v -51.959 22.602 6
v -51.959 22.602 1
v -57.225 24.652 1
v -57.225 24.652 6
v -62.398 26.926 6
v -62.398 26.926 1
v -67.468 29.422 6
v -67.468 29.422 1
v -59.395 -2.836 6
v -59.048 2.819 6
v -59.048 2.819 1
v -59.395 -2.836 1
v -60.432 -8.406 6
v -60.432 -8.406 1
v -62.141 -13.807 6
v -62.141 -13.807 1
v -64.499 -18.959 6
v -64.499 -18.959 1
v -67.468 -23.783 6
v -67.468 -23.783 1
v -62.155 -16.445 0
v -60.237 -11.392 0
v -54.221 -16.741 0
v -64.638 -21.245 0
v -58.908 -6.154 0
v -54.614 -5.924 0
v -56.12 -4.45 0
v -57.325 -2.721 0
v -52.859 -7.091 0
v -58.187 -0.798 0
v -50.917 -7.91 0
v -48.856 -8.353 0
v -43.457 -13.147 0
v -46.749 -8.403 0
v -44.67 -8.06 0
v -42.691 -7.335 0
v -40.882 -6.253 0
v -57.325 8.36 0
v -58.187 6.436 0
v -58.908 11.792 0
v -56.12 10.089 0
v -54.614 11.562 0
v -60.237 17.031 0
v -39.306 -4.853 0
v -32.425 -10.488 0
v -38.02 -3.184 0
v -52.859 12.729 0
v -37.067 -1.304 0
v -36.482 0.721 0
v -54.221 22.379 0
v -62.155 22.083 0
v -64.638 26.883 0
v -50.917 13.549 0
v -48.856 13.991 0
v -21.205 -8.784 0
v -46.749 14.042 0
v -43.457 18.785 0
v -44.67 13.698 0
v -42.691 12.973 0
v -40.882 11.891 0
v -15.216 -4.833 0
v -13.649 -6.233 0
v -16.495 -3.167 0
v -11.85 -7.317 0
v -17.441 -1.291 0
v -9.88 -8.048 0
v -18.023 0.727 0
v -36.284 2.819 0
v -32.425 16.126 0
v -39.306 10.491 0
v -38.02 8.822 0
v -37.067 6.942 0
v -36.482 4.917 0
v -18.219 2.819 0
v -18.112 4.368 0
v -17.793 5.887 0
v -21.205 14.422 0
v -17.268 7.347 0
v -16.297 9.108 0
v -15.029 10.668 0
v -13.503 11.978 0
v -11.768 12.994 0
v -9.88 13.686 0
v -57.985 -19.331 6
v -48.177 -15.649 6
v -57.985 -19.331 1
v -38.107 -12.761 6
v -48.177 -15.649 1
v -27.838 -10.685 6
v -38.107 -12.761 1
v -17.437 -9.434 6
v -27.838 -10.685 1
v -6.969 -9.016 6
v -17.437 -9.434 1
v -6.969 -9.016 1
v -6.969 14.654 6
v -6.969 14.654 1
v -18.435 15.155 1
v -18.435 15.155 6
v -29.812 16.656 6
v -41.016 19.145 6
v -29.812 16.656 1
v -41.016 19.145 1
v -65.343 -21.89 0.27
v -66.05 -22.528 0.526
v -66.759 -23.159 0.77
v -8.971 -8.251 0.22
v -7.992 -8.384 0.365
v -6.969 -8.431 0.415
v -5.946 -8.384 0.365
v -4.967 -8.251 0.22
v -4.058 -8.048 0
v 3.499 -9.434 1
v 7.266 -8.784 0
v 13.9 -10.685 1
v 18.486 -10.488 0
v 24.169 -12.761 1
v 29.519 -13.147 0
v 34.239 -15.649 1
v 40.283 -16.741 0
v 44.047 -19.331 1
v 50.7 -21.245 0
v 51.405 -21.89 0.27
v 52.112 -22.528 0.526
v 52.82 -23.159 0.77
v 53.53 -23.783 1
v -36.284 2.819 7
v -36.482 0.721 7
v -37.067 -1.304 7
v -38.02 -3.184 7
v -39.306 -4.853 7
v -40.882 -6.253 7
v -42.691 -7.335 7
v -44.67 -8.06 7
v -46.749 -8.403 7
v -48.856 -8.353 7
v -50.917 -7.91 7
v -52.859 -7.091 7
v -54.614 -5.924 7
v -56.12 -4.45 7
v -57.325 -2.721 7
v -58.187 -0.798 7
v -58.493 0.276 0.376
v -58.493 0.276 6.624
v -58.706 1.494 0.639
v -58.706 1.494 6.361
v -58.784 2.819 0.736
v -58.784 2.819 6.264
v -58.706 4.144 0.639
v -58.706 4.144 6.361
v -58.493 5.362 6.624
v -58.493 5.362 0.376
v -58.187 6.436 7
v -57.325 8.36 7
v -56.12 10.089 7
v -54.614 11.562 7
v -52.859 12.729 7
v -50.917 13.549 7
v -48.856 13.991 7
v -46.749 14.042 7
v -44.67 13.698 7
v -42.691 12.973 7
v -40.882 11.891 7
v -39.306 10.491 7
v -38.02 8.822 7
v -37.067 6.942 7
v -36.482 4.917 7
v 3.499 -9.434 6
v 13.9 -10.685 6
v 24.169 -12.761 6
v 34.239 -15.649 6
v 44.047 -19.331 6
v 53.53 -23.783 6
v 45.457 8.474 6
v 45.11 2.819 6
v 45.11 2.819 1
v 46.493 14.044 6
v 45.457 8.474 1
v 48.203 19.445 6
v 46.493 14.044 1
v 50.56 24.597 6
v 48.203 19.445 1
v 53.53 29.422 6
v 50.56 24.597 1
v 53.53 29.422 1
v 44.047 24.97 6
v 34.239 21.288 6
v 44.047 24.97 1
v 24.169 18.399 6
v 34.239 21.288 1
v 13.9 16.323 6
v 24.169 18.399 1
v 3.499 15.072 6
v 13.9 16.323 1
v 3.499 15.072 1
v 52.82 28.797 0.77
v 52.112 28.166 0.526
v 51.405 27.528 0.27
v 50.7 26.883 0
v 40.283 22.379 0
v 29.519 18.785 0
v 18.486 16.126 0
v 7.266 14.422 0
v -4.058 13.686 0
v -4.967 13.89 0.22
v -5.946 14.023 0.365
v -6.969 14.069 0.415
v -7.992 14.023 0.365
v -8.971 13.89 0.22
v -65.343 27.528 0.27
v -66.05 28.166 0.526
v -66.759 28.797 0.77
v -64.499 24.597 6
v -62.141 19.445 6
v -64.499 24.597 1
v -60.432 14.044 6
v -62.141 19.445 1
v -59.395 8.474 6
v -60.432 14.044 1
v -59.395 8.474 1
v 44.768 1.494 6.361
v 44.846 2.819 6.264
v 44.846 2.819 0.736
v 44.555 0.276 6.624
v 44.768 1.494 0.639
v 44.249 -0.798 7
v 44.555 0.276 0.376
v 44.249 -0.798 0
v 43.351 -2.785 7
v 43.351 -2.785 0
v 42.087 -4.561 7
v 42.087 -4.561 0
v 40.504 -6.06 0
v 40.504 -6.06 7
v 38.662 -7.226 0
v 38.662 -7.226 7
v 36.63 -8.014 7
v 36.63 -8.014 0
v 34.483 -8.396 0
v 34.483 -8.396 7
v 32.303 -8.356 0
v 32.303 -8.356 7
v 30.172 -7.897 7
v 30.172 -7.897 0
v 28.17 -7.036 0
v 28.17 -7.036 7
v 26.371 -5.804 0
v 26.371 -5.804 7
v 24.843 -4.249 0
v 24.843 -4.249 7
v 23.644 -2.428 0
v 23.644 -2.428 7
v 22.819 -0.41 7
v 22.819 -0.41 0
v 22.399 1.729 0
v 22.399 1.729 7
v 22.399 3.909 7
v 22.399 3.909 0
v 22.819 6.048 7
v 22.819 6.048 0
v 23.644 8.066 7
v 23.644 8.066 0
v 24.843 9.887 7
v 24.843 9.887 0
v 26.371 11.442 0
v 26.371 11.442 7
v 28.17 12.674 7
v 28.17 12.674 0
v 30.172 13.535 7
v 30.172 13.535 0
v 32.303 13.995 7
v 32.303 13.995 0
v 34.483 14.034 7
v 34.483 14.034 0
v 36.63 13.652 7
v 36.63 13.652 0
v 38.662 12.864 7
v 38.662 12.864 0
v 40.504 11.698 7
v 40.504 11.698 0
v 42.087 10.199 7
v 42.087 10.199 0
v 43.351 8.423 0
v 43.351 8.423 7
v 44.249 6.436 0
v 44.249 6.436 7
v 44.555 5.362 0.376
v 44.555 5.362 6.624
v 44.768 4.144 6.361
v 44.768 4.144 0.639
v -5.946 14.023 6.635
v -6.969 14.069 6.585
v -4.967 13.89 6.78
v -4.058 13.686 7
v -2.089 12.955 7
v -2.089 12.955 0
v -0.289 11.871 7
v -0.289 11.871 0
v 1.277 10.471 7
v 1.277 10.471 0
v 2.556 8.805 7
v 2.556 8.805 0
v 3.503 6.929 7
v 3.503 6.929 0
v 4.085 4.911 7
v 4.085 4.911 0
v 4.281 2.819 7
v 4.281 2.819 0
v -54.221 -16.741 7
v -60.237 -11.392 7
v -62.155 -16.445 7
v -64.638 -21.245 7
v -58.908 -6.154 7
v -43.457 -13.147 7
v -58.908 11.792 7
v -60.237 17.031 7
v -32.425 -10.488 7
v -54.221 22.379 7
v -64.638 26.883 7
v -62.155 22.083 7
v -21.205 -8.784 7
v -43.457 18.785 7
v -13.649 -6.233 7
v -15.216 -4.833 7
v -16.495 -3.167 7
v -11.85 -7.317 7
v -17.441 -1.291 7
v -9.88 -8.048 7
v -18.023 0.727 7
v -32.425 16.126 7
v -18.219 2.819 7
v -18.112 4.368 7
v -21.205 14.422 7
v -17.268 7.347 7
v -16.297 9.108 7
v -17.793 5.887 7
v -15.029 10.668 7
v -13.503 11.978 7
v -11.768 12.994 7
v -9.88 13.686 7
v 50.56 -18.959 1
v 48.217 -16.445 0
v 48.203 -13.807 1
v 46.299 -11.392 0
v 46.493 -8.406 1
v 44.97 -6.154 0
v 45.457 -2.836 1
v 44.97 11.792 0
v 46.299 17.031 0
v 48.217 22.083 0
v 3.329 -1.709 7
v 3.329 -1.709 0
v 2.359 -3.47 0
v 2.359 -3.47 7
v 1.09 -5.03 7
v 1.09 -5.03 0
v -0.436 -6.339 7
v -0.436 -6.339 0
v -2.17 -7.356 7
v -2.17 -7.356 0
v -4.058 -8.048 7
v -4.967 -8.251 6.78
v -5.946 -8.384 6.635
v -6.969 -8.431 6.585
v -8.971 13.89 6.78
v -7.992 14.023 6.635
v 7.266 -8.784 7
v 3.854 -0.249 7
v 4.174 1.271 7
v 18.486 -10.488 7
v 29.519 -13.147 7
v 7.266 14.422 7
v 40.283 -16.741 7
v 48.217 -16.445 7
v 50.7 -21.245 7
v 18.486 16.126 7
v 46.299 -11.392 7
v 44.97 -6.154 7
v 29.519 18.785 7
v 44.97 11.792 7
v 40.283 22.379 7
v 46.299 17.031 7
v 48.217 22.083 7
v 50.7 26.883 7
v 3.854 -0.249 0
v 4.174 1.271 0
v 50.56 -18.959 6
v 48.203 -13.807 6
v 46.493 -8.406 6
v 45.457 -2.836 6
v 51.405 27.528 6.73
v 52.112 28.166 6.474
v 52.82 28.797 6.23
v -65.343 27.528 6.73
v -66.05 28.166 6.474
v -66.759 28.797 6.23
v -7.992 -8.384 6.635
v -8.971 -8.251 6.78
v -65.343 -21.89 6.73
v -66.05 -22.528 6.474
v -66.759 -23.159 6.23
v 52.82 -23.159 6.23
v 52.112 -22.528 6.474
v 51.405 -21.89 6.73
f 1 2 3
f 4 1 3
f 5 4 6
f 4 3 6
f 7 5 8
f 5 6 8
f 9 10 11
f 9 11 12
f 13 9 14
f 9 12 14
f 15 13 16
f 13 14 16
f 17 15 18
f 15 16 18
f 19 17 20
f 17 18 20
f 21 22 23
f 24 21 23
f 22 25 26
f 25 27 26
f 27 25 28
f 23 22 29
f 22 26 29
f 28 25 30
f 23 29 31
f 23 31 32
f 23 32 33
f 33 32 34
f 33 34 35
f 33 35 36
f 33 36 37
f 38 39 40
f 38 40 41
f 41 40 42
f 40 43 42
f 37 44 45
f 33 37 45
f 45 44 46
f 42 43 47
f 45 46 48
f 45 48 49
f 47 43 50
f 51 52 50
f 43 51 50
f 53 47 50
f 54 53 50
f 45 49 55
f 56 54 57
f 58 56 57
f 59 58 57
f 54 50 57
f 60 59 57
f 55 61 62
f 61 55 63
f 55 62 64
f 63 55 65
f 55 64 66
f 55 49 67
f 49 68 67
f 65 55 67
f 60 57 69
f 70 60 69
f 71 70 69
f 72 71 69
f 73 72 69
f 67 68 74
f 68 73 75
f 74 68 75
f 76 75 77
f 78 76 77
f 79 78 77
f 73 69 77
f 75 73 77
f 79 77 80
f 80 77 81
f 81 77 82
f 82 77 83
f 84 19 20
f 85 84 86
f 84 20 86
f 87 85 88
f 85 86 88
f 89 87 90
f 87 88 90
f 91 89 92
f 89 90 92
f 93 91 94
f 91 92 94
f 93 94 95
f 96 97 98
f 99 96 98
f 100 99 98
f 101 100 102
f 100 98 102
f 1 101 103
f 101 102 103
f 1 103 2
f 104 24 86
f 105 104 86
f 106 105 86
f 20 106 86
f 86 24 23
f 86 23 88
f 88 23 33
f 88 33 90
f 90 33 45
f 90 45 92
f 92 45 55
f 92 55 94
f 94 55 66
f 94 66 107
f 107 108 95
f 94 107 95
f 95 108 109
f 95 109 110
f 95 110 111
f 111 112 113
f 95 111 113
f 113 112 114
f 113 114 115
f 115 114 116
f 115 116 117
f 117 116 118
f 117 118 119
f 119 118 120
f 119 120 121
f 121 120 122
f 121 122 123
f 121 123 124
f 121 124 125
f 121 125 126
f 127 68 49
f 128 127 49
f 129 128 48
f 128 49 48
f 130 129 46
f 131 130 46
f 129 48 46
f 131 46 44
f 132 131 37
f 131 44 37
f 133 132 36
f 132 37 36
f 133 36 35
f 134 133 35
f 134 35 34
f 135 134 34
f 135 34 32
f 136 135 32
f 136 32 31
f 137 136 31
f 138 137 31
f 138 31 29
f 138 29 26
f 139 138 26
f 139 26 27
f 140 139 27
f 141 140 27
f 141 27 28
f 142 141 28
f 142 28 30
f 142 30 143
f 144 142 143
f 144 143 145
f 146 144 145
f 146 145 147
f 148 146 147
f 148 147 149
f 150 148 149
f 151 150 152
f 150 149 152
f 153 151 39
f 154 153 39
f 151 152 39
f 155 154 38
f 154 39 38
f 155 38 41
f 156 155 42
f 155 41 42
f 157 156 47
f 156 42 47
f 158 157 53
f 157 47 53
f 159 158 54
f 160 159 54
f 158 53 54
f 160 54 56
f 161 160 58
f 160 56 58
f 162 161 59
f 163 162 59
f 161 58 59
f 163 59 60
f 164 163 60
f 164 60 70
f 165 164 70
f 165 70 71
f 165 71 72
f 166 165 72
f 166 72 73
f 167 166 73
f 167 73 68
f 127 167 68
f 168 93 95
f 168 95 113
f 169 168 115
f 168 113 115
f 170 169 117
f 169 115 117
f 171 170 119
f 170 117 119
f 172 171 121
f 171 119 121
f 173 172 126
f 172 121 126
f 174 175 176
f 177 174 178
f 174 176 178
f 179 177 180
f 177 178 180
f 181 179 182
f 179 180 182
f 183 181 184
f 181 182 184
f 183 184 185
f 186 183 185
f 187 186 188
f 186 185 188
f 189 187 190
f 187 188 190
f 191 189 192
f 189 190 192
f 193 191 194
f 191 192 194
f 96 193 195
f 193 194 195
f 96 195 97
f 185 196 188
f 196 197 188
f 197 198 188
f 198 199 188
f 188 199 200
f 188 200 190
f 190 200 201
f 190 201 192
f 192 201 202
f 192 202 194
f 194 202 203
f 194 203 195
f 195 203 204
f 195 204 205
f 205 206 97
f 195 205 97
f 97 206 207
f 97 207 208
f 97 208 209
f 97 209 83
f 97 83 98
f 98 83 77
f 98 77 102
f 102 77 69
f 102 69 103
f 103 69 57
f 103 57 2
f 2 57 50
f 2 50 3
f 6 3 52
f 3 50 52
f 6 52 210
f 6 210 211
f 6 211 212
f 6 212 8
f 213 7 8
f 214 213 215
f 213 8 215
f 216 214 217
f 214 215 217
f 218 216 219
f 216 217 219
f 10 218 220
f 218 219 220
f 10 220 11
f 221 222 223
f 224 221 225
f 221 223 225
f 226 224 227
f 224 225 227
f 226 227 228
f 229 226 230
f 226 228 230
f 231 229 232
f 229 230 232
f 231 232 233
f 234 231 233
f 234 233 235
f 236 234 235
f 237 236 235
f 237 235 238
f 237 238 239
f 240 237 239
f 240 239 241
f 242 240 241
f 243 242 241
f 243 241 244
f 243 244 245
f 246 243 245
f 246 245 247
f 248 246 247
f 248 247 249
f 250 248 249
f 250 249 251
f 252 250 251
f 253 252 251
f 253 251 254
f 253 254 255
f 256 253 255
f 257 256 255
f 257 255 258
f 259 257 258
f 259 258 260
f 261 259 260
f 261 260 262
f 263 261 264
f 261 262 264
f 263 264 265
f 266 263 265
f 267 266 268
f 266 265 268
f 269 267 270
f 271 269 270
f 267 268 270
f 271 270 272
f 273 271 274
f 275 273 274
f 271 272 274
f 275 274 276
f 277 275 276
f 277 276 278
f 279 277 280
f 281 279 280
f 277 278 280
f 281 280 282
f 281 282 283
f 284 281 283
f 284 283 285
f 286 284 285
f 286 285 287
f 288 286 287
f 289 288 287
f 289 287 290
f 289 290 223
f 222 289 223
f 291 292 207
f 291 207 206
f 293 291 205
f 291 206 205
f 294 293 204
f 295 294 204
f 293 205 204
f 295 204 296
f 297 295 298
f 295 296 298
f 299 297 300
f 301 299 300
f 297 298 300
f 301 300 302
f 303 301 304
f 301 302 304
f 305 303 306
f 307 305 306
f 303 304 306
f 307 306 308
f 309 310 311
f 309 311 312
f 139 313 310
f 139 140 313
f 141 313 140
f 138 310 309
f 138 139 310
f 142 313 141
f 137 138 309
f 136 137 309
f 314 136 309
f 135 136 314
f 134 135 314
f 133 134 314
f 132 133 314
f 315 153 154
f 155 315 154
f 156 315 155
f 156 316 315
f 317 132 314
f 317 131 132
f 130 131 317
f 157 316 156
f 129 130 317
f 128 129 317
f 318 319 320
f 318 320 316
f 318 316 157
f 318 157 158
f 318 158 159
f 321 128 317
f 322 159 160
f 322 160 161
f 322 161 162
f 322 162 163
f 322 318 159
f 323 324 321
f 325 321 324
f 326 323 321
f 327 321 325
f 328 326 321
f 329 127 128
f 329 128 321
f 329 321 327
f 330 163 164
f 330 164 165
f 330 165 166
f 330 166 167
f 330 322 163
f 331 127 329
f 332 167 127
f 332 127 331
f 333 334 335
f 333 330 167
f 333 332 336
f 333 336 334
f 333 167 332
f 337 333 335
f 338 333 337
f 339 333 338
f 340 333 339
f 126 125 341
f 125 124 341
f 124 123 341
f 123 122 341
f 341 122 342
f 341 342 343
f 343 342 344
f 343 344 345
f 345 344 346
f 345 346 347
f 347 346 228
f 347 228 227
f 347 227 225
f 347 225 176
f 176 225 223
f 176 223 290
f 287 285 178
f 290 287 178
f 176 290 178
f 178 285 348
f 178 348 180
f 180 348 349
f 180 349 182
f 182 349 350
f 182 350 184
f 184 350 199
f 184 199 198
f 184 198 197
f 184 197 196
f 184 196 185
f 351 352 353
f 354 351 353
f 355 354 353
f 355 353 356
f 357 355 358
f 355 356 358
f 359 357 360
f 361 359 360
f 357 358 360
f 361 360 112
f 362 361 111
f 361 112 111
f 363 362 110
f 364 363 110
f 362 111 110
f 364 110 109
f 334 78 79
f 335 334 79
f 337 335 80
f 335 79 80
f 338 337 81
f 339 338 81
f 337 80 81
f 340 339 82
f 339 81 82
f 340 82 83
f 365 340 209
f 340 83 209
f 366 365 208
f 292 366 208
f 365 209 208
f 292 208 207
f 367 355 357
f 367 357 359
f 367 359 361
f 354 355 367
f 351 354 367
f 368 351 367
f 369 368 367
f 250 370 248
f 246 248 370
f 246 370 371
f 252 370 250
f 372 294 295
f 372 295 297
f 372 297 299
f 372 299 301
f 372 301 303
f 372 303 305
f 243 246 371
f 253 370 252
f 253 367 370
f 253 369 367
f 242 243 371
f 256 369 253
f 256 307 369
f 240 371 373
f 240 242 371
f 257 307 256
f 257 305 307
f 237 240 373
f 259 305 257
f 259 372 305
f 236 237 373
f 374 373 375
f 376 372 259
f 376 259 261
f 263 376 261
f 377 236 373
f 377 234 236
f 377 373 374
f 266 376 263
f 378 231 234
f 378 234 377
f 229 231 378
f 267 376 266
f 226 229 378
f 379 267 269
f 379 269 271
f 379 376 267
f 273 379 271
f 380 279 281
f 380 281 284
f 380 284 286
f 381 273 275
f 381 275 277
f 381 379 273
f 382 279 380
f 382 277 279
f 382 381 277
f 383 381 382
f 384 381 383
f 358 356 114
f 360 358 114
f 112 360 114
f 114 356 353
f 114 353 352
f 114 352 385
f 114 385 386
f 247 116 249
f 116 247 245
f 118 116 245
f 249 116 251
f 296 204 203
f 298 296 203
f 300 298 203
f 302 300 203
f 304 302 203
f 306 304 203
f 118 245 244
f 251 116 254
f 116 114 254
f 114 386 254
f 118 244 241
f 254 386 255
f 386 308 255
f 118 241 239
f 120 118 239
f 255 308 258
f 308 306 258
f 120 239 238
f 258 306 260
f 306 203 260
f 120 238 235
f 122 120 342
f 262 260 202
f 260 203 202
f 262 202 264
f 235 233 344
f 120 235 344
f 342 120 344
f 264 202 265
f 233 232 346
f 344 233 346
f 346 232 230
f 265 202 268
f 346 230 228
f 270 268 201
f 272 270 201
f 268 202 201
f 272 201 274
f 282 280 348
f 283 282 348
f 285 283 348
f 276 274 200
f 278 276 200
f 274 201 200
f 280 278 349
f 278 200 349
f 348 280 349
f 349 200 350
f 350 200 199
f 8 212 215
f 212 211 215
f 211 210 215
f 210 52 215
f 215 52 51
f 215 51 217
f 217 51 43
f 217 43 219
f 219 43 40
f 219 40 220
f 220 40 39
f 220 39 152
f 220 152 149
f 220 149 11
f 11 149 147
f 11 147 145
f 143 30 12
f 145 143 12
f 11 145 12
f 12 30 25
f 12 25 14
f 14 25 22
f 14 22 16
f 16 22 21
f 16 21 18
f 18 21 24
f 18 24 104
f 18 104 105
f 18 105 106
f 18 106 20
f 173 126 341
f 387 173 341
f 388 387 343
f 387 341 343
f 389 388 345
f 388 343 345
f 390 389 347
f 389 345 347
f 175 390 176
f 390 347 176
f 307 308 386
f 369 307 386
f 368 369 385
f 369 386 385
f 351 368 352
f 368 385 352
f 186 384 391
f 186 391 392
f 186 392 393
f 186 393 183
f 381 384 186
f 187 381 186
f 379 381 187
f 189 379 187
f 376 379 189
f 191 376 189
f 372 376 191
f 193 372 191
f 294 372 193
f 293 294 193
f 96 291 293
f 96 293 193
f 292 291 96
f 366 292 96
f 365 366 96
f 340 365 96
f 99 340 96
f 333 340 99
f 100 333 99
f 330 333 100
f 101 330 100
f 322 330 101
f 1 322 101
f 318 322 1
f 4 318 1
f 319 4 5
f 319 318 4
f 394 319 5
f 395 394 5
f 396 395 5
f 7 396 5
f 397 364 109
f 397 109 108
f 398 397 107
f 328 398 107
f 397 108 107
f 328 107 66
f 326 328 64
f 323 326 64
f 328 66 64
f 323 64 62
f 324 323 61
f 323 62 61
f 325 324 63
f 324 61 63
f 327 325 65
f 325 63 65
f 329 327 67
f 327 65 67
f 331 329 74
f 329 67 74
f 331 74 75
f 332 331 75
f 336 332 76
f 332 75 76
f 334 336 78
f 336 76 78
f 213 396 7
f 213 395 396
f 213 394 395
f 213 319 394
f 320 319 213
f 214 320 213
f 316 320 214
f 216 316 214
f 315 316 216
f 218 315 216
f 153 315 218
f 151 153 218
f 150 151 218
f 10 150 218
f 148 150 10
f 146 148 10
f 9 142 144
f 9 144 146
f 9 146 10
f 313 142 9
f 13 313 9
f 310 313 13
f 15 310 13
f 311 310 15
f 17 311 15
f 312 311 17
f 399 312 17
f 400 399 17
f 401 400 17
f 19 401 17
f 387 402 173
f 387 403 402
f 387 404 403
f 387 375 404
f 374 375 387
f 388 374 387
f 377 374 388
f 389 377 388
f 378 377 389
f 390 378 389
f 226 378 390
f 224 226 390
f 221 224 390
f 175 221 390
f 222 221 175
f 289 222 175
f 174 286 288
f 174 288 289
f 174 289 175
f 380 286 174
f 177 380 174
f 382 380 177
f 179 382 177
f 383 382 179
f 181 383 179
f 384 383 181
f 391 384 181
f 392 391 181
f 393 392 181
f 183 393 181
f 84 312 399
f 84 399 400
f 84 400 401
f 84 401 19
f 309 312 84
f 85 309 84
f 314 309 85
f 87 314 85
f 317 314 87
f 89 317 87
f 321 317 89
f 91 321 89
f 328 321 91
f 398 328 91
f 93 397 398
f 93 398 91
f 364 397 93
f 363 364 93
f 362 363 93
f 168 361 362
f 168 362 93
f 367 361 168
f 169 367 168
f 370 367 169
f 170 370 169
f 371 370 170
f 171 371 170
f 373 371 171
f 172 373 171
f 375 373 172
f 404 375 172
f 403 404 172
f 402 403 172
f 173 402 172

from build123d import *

# Parameters (mm, degrees)
F1_DEPTH     = 7
F2_T2_ANGLE  = 57.1143931605
F2_T4_ANGLE  = 57.1143931605
F2_T6_ANGLE  = 76.6293726343
F2_T8_ANGLE  = 76.6293726343
F2_T10_ANGLE = 57.1143931605
F2_T12_ANGLE = 76.6293726343
F2_T14_ANGLE = 76.6293726343
F2_T16_ANGLE = 57.1143931605


# Not quite as in the source:
# - a fillet or chamfer that OpenCascade refuses, or shapes differently, is made with other operations: its cross-section is extruded or revolved along the edge and cut away or added


with BuildPart() as f1:
    # F0 (on Top) → F1 (new body)
    with BuildSketch(Plane.XY):
        with BuildLine():
            ThreePointArc((-51.9588312409, 22.6017753357), (-59.8237606638, 25.7612832302), (-67.4684691244, 29.4216162089))
            ThreePointArc((-67.4684691244, 29.4216162089), (-61.2035945552, 16.7707381256), (-59.0483218899, 2.8191013262))
            Line((-59.0483218899, 2.8191013262), (-58.7843277942, 2.8191013262))
            ThreePointArc((-58.7843277942, 2.8191013262), (-47.5343277942, 14.0691013262), (-36.2843277942, 2.8191013262))
            Line((-36.2843277942, 2.8191013262), (-18.2192023098, 2.8191013262))
            ThreePointArc((-18.2192023098, 2.8191013262), (-17.978724805, 5.1327379505), (-17.267573078, 7.3474630081))
            Line((-17.267573078, 7.3474630081), (-51.9588312409, 22.6017753357))
        make_face()
        with BuildLine():
            ThreePointArc((-6.9692023098, 14.6539675384), (-29.8123323501, 16.6561845448), (-51.9588312409, 22.6017753357))
            Line((-51.9588312409, 22.6017753357), (-17.267573078, 7.3474630081))
            ThreePointArc((-17.267573078, 7.3474630081), (-13.1181221775, 12.2399974863), (-6.9692023098, 14.0691013262))
            Line((-6.9692023098, 14.0691013262), (-6.9692023098, 14.6539675384))
        make_face()
        with BuildLine():
            Line((-58.7843277942, 2.8191013262), (-59.0483218899, 2.8191013262))
            ThreePointArc((-59.0483218899, 2.8191013262), (-61.2035945552, -11.1325354733), (-67.4684691244, -23.7834135565))
            ThreePointArc((-67.4684691244, -23.7834135565), (-38.1069797367, -12.7610910953), (-6.9692023098, -9.0157648861))
            Line((-6.9692023098, -9.0157648861), (-6.9692023098, -8.4308986738))
            ThreePointArc((-6.9692023098, -8.4308986738), (-14.9241535982, -5.1358499622), (-18.2192023098, 2.8191013262))
            Line((-18.2192023098, 2.8191013262), (-36.2843277942, 2.8191013262))
            ThreePointArc((-36.2843277942, 2.8191013262), (-47.5343277942, -8.4308986738), (-58.7843277942, 2.8191013262))
        make_face()
        with BuildLine():
            ThreePointArc((45.1099172702, 2.8191013262), (47.2651899355, 16.7707381256), (53.5300645047, 29.4216162089))
            ThreePointArc((53.5300645047, 29.4216162089), (24.168575117, 18.3992937476), (-6.9692023098, 14.6539675384))
            Line((-6.9692023098, 14.6539675384), (-6.9692023098, 14.0691013262))
            ThreePointArc((-6.9692023098, 14.0691013262), (0.9857489785, 10.7740526145), (4.2807976902, 2.8191013262))
            Line((4.2807976902, 2.8191013262), (22.3459231745, 2.8191013262))
            ThreePointArc((22.3459231745, 2.8191013262), (33.5959231745, 14.0691013262), (44.8459231745, 2.8191013262))
            Line((44.8459231745, 2.8191013262), (45.1099172702, 2.8191013262))
        make_face()
        with BuildLine():
            ThreePointArc((53.5300645047, -23.7834135565), (47.2651899355, -11.1325354733), (45.1099172702, 2.8191013262))
            Line((45.1099172702, 2.8191013262), (44.8459231745, 2.8191013262))
            ThreePointArc((44.8459231745, 2.8191013262), (33.5959231745, -8.4308986738), (22.3459231745, 2.8191013262))
            Line((22.3459231745, 2.8191013262), (4.2807976902, 2.8191013262))
            ThreePointArc((4.2807976902, 2.8191013262), (4.0403201853, 0.5054647019), (3.3291684583, -1.7092603557))
            Line((3.3291684583, -1.7092603557), (38.0204266212, -16.9635726834))
            ThreePointArc((38.0204266212, -16.9635726834), (45.8853560441, -20.1230805779), (53.5300645047, -23.7834135565))
        make_face()
        with BuildLine():
            Line((-6.9692023098, -8.4308986738), (-6.9692023098, -9.0157648861))
            ThreePointArc((-6.9692023098, -9.0157648861), (15.8739277304, -11.0179818925), (38.0204266212, -16.9635726834))
            Line((38.0204266212, -16.9635726834), (3.3291684583, -1.7092603557))
            ThreePointArc((3.3291684583, -1.7092603557), (-0.8202824422, -6.601794834), (-6.9692023098, -8.4308986738))
        make_face()
    extrude(amount=F1_DEPTH)

    # F2: chamfer of 1 on 8 edges, made by hand

    # F2_s1 → F2_t2 (revolve, cut)
    with BuildSketch(Plane(origin=(-64.2958342843, -34.9929409524, 0), x_dir=(0, 0, 1), z_dir=(-0.8783403422, -0.4780358179, 0))):
        Polygon((6, 11.3876031391), (7, 12.3876031391), (7, 11.3876031391), align=None)
    revolve(axis=Axis((-6.9692023098, -140.3245743959, 7), (0, 0, -1)), revolution_arc=F2_T2_ANGLE, mode=Mode.SUBTRACT)

    # F2_s3 → F2_t4 (revolve, cut)
    with BuildSketch(Plane(origin=(55.9099674663, 30.4289416566, 0), x_dir=(0, 0, 1), z_dir=(0.8783403422, 0.4780358179, 0))):
        Polygon((6, -0.2277143611), (7, 0.7722856389), (7, -0.2277143611), align=None)
    revolve(axis=Axis((-6.9692023098, 145.9627770483, 7), (0, 0, -1)), revolution_arc=F2_T4_ANGLE, mode=Mode.SUBTRACT)

    # F2_s5 → F2_t6 (revolve, cut)
    with BuildSketch(Plane(origin=(-41.8392456248, 52.9497637497, 0), x_dir=(0, 0, 1), z_dir=(-0.6199801689, 0.7846174801, 0))):
        Polygon((6, -34.6245823345), (7, -33.6245823345), (7, -34.6245823345), align=None)
    revolve(axis=Axis((-105.2822329994, 2.8191013262, 7), (0, 0, -1)), revolution_arc=F2_T6_ANGLE, mode=Mode.SUBTRACT)

    # F2_s7 → F2_t8 (revolve, cut)
    with BuildSketch(Plane(origin=(-41.8392456248, 52.9497637497, 0), x_dir=(0, 0, 1), z_dir=(-0.6199801689, 0.7846174801, 0))):
        Polygon((1, -34.6245823345), (0, -33.6245823345), (0, -34.6245823345), align=None)
    revolve(axis=Axis((-105.2822329994, 2.8191013262, 0), (0, 0, -1)), revolution_arc=F2_T8_ANGLE, mode=Mode.SUBTRACT)

    # F2_s9 → F2_t10 (revolve, cut)
    with BuildSketch(Plane(origin=(55.9099674663, 30.4289416566, 0), x_dir=(0, 0, 1), z_dir=(0.8783403422, 0.4780358179, 0))):
        Polygon((1, -0.2277143611), (0, 0.7722856389), (0, -0.2277143611), align=None)
    revolve(axis=Axis((-6.9692023098, 145.9627770483, 0), (0, 0, -1)), revolution_arc=F2_T10_ANGLE, mode=Mode.SUBTRACT)

    # F2_s11 → F2_t12 (revolve, cut)
    with BuildSketch(Plane(origin=(33.7389773041, -42.6984485674, 0), x_dir=(0, 0, 1), z_dir=(0.6199801689, -0.7846174801, 0))):
        Polygon((1, -27.1838402573), (0, -26.1838402573), (0, -27.1838402573), align=None)
    revolve(axis=Axis((91.3438283797, 2.8191013262, 0), (0, 0, -1)), revolution_arc=F2_T12_ANGLE, mode=Mode.SUBTRACT)

    # F2_s13 → F2_t14 (revolve, cut)
    with BuildSketch(Plane(origin=(33.7389773041, -42.6984485674, 0), x_dir=(0, 0, 1), z_dir=(0.6199801689, -0.7846174801, 0))):
        Polygon((6, -27.1838402573), (7, -26.1838402573), (7, -27.1838402573), align=None)
    revolve(axis=Axis((91.3438283797, 2.8191013262, 7), (0, 0, -1)), revolution_arc=F2_T14_ANGLE, mode=Mode.SUBTRACT)

    # F2_s15 → F2_t16 (revolve, cut)
    with BuildSketch(Plane(origin=(-64.2958342843, -34.9929409524, 0), x_dir=(0, 0, 1), z_dir=(-0.8783403422, -0.4780358179, 0))):
        Polygon((1, 11.3876031391), (0, 12.3876031391), (0, 11.3876031391), align=None)
    revolve(axis=Axis((-6.9692023098, -140.3245743959, 0), (0, 0, -1)), revolution_arc=F2_T16_ANGLE, mode=Mode.SUBTRACT)


solid = f1.part
